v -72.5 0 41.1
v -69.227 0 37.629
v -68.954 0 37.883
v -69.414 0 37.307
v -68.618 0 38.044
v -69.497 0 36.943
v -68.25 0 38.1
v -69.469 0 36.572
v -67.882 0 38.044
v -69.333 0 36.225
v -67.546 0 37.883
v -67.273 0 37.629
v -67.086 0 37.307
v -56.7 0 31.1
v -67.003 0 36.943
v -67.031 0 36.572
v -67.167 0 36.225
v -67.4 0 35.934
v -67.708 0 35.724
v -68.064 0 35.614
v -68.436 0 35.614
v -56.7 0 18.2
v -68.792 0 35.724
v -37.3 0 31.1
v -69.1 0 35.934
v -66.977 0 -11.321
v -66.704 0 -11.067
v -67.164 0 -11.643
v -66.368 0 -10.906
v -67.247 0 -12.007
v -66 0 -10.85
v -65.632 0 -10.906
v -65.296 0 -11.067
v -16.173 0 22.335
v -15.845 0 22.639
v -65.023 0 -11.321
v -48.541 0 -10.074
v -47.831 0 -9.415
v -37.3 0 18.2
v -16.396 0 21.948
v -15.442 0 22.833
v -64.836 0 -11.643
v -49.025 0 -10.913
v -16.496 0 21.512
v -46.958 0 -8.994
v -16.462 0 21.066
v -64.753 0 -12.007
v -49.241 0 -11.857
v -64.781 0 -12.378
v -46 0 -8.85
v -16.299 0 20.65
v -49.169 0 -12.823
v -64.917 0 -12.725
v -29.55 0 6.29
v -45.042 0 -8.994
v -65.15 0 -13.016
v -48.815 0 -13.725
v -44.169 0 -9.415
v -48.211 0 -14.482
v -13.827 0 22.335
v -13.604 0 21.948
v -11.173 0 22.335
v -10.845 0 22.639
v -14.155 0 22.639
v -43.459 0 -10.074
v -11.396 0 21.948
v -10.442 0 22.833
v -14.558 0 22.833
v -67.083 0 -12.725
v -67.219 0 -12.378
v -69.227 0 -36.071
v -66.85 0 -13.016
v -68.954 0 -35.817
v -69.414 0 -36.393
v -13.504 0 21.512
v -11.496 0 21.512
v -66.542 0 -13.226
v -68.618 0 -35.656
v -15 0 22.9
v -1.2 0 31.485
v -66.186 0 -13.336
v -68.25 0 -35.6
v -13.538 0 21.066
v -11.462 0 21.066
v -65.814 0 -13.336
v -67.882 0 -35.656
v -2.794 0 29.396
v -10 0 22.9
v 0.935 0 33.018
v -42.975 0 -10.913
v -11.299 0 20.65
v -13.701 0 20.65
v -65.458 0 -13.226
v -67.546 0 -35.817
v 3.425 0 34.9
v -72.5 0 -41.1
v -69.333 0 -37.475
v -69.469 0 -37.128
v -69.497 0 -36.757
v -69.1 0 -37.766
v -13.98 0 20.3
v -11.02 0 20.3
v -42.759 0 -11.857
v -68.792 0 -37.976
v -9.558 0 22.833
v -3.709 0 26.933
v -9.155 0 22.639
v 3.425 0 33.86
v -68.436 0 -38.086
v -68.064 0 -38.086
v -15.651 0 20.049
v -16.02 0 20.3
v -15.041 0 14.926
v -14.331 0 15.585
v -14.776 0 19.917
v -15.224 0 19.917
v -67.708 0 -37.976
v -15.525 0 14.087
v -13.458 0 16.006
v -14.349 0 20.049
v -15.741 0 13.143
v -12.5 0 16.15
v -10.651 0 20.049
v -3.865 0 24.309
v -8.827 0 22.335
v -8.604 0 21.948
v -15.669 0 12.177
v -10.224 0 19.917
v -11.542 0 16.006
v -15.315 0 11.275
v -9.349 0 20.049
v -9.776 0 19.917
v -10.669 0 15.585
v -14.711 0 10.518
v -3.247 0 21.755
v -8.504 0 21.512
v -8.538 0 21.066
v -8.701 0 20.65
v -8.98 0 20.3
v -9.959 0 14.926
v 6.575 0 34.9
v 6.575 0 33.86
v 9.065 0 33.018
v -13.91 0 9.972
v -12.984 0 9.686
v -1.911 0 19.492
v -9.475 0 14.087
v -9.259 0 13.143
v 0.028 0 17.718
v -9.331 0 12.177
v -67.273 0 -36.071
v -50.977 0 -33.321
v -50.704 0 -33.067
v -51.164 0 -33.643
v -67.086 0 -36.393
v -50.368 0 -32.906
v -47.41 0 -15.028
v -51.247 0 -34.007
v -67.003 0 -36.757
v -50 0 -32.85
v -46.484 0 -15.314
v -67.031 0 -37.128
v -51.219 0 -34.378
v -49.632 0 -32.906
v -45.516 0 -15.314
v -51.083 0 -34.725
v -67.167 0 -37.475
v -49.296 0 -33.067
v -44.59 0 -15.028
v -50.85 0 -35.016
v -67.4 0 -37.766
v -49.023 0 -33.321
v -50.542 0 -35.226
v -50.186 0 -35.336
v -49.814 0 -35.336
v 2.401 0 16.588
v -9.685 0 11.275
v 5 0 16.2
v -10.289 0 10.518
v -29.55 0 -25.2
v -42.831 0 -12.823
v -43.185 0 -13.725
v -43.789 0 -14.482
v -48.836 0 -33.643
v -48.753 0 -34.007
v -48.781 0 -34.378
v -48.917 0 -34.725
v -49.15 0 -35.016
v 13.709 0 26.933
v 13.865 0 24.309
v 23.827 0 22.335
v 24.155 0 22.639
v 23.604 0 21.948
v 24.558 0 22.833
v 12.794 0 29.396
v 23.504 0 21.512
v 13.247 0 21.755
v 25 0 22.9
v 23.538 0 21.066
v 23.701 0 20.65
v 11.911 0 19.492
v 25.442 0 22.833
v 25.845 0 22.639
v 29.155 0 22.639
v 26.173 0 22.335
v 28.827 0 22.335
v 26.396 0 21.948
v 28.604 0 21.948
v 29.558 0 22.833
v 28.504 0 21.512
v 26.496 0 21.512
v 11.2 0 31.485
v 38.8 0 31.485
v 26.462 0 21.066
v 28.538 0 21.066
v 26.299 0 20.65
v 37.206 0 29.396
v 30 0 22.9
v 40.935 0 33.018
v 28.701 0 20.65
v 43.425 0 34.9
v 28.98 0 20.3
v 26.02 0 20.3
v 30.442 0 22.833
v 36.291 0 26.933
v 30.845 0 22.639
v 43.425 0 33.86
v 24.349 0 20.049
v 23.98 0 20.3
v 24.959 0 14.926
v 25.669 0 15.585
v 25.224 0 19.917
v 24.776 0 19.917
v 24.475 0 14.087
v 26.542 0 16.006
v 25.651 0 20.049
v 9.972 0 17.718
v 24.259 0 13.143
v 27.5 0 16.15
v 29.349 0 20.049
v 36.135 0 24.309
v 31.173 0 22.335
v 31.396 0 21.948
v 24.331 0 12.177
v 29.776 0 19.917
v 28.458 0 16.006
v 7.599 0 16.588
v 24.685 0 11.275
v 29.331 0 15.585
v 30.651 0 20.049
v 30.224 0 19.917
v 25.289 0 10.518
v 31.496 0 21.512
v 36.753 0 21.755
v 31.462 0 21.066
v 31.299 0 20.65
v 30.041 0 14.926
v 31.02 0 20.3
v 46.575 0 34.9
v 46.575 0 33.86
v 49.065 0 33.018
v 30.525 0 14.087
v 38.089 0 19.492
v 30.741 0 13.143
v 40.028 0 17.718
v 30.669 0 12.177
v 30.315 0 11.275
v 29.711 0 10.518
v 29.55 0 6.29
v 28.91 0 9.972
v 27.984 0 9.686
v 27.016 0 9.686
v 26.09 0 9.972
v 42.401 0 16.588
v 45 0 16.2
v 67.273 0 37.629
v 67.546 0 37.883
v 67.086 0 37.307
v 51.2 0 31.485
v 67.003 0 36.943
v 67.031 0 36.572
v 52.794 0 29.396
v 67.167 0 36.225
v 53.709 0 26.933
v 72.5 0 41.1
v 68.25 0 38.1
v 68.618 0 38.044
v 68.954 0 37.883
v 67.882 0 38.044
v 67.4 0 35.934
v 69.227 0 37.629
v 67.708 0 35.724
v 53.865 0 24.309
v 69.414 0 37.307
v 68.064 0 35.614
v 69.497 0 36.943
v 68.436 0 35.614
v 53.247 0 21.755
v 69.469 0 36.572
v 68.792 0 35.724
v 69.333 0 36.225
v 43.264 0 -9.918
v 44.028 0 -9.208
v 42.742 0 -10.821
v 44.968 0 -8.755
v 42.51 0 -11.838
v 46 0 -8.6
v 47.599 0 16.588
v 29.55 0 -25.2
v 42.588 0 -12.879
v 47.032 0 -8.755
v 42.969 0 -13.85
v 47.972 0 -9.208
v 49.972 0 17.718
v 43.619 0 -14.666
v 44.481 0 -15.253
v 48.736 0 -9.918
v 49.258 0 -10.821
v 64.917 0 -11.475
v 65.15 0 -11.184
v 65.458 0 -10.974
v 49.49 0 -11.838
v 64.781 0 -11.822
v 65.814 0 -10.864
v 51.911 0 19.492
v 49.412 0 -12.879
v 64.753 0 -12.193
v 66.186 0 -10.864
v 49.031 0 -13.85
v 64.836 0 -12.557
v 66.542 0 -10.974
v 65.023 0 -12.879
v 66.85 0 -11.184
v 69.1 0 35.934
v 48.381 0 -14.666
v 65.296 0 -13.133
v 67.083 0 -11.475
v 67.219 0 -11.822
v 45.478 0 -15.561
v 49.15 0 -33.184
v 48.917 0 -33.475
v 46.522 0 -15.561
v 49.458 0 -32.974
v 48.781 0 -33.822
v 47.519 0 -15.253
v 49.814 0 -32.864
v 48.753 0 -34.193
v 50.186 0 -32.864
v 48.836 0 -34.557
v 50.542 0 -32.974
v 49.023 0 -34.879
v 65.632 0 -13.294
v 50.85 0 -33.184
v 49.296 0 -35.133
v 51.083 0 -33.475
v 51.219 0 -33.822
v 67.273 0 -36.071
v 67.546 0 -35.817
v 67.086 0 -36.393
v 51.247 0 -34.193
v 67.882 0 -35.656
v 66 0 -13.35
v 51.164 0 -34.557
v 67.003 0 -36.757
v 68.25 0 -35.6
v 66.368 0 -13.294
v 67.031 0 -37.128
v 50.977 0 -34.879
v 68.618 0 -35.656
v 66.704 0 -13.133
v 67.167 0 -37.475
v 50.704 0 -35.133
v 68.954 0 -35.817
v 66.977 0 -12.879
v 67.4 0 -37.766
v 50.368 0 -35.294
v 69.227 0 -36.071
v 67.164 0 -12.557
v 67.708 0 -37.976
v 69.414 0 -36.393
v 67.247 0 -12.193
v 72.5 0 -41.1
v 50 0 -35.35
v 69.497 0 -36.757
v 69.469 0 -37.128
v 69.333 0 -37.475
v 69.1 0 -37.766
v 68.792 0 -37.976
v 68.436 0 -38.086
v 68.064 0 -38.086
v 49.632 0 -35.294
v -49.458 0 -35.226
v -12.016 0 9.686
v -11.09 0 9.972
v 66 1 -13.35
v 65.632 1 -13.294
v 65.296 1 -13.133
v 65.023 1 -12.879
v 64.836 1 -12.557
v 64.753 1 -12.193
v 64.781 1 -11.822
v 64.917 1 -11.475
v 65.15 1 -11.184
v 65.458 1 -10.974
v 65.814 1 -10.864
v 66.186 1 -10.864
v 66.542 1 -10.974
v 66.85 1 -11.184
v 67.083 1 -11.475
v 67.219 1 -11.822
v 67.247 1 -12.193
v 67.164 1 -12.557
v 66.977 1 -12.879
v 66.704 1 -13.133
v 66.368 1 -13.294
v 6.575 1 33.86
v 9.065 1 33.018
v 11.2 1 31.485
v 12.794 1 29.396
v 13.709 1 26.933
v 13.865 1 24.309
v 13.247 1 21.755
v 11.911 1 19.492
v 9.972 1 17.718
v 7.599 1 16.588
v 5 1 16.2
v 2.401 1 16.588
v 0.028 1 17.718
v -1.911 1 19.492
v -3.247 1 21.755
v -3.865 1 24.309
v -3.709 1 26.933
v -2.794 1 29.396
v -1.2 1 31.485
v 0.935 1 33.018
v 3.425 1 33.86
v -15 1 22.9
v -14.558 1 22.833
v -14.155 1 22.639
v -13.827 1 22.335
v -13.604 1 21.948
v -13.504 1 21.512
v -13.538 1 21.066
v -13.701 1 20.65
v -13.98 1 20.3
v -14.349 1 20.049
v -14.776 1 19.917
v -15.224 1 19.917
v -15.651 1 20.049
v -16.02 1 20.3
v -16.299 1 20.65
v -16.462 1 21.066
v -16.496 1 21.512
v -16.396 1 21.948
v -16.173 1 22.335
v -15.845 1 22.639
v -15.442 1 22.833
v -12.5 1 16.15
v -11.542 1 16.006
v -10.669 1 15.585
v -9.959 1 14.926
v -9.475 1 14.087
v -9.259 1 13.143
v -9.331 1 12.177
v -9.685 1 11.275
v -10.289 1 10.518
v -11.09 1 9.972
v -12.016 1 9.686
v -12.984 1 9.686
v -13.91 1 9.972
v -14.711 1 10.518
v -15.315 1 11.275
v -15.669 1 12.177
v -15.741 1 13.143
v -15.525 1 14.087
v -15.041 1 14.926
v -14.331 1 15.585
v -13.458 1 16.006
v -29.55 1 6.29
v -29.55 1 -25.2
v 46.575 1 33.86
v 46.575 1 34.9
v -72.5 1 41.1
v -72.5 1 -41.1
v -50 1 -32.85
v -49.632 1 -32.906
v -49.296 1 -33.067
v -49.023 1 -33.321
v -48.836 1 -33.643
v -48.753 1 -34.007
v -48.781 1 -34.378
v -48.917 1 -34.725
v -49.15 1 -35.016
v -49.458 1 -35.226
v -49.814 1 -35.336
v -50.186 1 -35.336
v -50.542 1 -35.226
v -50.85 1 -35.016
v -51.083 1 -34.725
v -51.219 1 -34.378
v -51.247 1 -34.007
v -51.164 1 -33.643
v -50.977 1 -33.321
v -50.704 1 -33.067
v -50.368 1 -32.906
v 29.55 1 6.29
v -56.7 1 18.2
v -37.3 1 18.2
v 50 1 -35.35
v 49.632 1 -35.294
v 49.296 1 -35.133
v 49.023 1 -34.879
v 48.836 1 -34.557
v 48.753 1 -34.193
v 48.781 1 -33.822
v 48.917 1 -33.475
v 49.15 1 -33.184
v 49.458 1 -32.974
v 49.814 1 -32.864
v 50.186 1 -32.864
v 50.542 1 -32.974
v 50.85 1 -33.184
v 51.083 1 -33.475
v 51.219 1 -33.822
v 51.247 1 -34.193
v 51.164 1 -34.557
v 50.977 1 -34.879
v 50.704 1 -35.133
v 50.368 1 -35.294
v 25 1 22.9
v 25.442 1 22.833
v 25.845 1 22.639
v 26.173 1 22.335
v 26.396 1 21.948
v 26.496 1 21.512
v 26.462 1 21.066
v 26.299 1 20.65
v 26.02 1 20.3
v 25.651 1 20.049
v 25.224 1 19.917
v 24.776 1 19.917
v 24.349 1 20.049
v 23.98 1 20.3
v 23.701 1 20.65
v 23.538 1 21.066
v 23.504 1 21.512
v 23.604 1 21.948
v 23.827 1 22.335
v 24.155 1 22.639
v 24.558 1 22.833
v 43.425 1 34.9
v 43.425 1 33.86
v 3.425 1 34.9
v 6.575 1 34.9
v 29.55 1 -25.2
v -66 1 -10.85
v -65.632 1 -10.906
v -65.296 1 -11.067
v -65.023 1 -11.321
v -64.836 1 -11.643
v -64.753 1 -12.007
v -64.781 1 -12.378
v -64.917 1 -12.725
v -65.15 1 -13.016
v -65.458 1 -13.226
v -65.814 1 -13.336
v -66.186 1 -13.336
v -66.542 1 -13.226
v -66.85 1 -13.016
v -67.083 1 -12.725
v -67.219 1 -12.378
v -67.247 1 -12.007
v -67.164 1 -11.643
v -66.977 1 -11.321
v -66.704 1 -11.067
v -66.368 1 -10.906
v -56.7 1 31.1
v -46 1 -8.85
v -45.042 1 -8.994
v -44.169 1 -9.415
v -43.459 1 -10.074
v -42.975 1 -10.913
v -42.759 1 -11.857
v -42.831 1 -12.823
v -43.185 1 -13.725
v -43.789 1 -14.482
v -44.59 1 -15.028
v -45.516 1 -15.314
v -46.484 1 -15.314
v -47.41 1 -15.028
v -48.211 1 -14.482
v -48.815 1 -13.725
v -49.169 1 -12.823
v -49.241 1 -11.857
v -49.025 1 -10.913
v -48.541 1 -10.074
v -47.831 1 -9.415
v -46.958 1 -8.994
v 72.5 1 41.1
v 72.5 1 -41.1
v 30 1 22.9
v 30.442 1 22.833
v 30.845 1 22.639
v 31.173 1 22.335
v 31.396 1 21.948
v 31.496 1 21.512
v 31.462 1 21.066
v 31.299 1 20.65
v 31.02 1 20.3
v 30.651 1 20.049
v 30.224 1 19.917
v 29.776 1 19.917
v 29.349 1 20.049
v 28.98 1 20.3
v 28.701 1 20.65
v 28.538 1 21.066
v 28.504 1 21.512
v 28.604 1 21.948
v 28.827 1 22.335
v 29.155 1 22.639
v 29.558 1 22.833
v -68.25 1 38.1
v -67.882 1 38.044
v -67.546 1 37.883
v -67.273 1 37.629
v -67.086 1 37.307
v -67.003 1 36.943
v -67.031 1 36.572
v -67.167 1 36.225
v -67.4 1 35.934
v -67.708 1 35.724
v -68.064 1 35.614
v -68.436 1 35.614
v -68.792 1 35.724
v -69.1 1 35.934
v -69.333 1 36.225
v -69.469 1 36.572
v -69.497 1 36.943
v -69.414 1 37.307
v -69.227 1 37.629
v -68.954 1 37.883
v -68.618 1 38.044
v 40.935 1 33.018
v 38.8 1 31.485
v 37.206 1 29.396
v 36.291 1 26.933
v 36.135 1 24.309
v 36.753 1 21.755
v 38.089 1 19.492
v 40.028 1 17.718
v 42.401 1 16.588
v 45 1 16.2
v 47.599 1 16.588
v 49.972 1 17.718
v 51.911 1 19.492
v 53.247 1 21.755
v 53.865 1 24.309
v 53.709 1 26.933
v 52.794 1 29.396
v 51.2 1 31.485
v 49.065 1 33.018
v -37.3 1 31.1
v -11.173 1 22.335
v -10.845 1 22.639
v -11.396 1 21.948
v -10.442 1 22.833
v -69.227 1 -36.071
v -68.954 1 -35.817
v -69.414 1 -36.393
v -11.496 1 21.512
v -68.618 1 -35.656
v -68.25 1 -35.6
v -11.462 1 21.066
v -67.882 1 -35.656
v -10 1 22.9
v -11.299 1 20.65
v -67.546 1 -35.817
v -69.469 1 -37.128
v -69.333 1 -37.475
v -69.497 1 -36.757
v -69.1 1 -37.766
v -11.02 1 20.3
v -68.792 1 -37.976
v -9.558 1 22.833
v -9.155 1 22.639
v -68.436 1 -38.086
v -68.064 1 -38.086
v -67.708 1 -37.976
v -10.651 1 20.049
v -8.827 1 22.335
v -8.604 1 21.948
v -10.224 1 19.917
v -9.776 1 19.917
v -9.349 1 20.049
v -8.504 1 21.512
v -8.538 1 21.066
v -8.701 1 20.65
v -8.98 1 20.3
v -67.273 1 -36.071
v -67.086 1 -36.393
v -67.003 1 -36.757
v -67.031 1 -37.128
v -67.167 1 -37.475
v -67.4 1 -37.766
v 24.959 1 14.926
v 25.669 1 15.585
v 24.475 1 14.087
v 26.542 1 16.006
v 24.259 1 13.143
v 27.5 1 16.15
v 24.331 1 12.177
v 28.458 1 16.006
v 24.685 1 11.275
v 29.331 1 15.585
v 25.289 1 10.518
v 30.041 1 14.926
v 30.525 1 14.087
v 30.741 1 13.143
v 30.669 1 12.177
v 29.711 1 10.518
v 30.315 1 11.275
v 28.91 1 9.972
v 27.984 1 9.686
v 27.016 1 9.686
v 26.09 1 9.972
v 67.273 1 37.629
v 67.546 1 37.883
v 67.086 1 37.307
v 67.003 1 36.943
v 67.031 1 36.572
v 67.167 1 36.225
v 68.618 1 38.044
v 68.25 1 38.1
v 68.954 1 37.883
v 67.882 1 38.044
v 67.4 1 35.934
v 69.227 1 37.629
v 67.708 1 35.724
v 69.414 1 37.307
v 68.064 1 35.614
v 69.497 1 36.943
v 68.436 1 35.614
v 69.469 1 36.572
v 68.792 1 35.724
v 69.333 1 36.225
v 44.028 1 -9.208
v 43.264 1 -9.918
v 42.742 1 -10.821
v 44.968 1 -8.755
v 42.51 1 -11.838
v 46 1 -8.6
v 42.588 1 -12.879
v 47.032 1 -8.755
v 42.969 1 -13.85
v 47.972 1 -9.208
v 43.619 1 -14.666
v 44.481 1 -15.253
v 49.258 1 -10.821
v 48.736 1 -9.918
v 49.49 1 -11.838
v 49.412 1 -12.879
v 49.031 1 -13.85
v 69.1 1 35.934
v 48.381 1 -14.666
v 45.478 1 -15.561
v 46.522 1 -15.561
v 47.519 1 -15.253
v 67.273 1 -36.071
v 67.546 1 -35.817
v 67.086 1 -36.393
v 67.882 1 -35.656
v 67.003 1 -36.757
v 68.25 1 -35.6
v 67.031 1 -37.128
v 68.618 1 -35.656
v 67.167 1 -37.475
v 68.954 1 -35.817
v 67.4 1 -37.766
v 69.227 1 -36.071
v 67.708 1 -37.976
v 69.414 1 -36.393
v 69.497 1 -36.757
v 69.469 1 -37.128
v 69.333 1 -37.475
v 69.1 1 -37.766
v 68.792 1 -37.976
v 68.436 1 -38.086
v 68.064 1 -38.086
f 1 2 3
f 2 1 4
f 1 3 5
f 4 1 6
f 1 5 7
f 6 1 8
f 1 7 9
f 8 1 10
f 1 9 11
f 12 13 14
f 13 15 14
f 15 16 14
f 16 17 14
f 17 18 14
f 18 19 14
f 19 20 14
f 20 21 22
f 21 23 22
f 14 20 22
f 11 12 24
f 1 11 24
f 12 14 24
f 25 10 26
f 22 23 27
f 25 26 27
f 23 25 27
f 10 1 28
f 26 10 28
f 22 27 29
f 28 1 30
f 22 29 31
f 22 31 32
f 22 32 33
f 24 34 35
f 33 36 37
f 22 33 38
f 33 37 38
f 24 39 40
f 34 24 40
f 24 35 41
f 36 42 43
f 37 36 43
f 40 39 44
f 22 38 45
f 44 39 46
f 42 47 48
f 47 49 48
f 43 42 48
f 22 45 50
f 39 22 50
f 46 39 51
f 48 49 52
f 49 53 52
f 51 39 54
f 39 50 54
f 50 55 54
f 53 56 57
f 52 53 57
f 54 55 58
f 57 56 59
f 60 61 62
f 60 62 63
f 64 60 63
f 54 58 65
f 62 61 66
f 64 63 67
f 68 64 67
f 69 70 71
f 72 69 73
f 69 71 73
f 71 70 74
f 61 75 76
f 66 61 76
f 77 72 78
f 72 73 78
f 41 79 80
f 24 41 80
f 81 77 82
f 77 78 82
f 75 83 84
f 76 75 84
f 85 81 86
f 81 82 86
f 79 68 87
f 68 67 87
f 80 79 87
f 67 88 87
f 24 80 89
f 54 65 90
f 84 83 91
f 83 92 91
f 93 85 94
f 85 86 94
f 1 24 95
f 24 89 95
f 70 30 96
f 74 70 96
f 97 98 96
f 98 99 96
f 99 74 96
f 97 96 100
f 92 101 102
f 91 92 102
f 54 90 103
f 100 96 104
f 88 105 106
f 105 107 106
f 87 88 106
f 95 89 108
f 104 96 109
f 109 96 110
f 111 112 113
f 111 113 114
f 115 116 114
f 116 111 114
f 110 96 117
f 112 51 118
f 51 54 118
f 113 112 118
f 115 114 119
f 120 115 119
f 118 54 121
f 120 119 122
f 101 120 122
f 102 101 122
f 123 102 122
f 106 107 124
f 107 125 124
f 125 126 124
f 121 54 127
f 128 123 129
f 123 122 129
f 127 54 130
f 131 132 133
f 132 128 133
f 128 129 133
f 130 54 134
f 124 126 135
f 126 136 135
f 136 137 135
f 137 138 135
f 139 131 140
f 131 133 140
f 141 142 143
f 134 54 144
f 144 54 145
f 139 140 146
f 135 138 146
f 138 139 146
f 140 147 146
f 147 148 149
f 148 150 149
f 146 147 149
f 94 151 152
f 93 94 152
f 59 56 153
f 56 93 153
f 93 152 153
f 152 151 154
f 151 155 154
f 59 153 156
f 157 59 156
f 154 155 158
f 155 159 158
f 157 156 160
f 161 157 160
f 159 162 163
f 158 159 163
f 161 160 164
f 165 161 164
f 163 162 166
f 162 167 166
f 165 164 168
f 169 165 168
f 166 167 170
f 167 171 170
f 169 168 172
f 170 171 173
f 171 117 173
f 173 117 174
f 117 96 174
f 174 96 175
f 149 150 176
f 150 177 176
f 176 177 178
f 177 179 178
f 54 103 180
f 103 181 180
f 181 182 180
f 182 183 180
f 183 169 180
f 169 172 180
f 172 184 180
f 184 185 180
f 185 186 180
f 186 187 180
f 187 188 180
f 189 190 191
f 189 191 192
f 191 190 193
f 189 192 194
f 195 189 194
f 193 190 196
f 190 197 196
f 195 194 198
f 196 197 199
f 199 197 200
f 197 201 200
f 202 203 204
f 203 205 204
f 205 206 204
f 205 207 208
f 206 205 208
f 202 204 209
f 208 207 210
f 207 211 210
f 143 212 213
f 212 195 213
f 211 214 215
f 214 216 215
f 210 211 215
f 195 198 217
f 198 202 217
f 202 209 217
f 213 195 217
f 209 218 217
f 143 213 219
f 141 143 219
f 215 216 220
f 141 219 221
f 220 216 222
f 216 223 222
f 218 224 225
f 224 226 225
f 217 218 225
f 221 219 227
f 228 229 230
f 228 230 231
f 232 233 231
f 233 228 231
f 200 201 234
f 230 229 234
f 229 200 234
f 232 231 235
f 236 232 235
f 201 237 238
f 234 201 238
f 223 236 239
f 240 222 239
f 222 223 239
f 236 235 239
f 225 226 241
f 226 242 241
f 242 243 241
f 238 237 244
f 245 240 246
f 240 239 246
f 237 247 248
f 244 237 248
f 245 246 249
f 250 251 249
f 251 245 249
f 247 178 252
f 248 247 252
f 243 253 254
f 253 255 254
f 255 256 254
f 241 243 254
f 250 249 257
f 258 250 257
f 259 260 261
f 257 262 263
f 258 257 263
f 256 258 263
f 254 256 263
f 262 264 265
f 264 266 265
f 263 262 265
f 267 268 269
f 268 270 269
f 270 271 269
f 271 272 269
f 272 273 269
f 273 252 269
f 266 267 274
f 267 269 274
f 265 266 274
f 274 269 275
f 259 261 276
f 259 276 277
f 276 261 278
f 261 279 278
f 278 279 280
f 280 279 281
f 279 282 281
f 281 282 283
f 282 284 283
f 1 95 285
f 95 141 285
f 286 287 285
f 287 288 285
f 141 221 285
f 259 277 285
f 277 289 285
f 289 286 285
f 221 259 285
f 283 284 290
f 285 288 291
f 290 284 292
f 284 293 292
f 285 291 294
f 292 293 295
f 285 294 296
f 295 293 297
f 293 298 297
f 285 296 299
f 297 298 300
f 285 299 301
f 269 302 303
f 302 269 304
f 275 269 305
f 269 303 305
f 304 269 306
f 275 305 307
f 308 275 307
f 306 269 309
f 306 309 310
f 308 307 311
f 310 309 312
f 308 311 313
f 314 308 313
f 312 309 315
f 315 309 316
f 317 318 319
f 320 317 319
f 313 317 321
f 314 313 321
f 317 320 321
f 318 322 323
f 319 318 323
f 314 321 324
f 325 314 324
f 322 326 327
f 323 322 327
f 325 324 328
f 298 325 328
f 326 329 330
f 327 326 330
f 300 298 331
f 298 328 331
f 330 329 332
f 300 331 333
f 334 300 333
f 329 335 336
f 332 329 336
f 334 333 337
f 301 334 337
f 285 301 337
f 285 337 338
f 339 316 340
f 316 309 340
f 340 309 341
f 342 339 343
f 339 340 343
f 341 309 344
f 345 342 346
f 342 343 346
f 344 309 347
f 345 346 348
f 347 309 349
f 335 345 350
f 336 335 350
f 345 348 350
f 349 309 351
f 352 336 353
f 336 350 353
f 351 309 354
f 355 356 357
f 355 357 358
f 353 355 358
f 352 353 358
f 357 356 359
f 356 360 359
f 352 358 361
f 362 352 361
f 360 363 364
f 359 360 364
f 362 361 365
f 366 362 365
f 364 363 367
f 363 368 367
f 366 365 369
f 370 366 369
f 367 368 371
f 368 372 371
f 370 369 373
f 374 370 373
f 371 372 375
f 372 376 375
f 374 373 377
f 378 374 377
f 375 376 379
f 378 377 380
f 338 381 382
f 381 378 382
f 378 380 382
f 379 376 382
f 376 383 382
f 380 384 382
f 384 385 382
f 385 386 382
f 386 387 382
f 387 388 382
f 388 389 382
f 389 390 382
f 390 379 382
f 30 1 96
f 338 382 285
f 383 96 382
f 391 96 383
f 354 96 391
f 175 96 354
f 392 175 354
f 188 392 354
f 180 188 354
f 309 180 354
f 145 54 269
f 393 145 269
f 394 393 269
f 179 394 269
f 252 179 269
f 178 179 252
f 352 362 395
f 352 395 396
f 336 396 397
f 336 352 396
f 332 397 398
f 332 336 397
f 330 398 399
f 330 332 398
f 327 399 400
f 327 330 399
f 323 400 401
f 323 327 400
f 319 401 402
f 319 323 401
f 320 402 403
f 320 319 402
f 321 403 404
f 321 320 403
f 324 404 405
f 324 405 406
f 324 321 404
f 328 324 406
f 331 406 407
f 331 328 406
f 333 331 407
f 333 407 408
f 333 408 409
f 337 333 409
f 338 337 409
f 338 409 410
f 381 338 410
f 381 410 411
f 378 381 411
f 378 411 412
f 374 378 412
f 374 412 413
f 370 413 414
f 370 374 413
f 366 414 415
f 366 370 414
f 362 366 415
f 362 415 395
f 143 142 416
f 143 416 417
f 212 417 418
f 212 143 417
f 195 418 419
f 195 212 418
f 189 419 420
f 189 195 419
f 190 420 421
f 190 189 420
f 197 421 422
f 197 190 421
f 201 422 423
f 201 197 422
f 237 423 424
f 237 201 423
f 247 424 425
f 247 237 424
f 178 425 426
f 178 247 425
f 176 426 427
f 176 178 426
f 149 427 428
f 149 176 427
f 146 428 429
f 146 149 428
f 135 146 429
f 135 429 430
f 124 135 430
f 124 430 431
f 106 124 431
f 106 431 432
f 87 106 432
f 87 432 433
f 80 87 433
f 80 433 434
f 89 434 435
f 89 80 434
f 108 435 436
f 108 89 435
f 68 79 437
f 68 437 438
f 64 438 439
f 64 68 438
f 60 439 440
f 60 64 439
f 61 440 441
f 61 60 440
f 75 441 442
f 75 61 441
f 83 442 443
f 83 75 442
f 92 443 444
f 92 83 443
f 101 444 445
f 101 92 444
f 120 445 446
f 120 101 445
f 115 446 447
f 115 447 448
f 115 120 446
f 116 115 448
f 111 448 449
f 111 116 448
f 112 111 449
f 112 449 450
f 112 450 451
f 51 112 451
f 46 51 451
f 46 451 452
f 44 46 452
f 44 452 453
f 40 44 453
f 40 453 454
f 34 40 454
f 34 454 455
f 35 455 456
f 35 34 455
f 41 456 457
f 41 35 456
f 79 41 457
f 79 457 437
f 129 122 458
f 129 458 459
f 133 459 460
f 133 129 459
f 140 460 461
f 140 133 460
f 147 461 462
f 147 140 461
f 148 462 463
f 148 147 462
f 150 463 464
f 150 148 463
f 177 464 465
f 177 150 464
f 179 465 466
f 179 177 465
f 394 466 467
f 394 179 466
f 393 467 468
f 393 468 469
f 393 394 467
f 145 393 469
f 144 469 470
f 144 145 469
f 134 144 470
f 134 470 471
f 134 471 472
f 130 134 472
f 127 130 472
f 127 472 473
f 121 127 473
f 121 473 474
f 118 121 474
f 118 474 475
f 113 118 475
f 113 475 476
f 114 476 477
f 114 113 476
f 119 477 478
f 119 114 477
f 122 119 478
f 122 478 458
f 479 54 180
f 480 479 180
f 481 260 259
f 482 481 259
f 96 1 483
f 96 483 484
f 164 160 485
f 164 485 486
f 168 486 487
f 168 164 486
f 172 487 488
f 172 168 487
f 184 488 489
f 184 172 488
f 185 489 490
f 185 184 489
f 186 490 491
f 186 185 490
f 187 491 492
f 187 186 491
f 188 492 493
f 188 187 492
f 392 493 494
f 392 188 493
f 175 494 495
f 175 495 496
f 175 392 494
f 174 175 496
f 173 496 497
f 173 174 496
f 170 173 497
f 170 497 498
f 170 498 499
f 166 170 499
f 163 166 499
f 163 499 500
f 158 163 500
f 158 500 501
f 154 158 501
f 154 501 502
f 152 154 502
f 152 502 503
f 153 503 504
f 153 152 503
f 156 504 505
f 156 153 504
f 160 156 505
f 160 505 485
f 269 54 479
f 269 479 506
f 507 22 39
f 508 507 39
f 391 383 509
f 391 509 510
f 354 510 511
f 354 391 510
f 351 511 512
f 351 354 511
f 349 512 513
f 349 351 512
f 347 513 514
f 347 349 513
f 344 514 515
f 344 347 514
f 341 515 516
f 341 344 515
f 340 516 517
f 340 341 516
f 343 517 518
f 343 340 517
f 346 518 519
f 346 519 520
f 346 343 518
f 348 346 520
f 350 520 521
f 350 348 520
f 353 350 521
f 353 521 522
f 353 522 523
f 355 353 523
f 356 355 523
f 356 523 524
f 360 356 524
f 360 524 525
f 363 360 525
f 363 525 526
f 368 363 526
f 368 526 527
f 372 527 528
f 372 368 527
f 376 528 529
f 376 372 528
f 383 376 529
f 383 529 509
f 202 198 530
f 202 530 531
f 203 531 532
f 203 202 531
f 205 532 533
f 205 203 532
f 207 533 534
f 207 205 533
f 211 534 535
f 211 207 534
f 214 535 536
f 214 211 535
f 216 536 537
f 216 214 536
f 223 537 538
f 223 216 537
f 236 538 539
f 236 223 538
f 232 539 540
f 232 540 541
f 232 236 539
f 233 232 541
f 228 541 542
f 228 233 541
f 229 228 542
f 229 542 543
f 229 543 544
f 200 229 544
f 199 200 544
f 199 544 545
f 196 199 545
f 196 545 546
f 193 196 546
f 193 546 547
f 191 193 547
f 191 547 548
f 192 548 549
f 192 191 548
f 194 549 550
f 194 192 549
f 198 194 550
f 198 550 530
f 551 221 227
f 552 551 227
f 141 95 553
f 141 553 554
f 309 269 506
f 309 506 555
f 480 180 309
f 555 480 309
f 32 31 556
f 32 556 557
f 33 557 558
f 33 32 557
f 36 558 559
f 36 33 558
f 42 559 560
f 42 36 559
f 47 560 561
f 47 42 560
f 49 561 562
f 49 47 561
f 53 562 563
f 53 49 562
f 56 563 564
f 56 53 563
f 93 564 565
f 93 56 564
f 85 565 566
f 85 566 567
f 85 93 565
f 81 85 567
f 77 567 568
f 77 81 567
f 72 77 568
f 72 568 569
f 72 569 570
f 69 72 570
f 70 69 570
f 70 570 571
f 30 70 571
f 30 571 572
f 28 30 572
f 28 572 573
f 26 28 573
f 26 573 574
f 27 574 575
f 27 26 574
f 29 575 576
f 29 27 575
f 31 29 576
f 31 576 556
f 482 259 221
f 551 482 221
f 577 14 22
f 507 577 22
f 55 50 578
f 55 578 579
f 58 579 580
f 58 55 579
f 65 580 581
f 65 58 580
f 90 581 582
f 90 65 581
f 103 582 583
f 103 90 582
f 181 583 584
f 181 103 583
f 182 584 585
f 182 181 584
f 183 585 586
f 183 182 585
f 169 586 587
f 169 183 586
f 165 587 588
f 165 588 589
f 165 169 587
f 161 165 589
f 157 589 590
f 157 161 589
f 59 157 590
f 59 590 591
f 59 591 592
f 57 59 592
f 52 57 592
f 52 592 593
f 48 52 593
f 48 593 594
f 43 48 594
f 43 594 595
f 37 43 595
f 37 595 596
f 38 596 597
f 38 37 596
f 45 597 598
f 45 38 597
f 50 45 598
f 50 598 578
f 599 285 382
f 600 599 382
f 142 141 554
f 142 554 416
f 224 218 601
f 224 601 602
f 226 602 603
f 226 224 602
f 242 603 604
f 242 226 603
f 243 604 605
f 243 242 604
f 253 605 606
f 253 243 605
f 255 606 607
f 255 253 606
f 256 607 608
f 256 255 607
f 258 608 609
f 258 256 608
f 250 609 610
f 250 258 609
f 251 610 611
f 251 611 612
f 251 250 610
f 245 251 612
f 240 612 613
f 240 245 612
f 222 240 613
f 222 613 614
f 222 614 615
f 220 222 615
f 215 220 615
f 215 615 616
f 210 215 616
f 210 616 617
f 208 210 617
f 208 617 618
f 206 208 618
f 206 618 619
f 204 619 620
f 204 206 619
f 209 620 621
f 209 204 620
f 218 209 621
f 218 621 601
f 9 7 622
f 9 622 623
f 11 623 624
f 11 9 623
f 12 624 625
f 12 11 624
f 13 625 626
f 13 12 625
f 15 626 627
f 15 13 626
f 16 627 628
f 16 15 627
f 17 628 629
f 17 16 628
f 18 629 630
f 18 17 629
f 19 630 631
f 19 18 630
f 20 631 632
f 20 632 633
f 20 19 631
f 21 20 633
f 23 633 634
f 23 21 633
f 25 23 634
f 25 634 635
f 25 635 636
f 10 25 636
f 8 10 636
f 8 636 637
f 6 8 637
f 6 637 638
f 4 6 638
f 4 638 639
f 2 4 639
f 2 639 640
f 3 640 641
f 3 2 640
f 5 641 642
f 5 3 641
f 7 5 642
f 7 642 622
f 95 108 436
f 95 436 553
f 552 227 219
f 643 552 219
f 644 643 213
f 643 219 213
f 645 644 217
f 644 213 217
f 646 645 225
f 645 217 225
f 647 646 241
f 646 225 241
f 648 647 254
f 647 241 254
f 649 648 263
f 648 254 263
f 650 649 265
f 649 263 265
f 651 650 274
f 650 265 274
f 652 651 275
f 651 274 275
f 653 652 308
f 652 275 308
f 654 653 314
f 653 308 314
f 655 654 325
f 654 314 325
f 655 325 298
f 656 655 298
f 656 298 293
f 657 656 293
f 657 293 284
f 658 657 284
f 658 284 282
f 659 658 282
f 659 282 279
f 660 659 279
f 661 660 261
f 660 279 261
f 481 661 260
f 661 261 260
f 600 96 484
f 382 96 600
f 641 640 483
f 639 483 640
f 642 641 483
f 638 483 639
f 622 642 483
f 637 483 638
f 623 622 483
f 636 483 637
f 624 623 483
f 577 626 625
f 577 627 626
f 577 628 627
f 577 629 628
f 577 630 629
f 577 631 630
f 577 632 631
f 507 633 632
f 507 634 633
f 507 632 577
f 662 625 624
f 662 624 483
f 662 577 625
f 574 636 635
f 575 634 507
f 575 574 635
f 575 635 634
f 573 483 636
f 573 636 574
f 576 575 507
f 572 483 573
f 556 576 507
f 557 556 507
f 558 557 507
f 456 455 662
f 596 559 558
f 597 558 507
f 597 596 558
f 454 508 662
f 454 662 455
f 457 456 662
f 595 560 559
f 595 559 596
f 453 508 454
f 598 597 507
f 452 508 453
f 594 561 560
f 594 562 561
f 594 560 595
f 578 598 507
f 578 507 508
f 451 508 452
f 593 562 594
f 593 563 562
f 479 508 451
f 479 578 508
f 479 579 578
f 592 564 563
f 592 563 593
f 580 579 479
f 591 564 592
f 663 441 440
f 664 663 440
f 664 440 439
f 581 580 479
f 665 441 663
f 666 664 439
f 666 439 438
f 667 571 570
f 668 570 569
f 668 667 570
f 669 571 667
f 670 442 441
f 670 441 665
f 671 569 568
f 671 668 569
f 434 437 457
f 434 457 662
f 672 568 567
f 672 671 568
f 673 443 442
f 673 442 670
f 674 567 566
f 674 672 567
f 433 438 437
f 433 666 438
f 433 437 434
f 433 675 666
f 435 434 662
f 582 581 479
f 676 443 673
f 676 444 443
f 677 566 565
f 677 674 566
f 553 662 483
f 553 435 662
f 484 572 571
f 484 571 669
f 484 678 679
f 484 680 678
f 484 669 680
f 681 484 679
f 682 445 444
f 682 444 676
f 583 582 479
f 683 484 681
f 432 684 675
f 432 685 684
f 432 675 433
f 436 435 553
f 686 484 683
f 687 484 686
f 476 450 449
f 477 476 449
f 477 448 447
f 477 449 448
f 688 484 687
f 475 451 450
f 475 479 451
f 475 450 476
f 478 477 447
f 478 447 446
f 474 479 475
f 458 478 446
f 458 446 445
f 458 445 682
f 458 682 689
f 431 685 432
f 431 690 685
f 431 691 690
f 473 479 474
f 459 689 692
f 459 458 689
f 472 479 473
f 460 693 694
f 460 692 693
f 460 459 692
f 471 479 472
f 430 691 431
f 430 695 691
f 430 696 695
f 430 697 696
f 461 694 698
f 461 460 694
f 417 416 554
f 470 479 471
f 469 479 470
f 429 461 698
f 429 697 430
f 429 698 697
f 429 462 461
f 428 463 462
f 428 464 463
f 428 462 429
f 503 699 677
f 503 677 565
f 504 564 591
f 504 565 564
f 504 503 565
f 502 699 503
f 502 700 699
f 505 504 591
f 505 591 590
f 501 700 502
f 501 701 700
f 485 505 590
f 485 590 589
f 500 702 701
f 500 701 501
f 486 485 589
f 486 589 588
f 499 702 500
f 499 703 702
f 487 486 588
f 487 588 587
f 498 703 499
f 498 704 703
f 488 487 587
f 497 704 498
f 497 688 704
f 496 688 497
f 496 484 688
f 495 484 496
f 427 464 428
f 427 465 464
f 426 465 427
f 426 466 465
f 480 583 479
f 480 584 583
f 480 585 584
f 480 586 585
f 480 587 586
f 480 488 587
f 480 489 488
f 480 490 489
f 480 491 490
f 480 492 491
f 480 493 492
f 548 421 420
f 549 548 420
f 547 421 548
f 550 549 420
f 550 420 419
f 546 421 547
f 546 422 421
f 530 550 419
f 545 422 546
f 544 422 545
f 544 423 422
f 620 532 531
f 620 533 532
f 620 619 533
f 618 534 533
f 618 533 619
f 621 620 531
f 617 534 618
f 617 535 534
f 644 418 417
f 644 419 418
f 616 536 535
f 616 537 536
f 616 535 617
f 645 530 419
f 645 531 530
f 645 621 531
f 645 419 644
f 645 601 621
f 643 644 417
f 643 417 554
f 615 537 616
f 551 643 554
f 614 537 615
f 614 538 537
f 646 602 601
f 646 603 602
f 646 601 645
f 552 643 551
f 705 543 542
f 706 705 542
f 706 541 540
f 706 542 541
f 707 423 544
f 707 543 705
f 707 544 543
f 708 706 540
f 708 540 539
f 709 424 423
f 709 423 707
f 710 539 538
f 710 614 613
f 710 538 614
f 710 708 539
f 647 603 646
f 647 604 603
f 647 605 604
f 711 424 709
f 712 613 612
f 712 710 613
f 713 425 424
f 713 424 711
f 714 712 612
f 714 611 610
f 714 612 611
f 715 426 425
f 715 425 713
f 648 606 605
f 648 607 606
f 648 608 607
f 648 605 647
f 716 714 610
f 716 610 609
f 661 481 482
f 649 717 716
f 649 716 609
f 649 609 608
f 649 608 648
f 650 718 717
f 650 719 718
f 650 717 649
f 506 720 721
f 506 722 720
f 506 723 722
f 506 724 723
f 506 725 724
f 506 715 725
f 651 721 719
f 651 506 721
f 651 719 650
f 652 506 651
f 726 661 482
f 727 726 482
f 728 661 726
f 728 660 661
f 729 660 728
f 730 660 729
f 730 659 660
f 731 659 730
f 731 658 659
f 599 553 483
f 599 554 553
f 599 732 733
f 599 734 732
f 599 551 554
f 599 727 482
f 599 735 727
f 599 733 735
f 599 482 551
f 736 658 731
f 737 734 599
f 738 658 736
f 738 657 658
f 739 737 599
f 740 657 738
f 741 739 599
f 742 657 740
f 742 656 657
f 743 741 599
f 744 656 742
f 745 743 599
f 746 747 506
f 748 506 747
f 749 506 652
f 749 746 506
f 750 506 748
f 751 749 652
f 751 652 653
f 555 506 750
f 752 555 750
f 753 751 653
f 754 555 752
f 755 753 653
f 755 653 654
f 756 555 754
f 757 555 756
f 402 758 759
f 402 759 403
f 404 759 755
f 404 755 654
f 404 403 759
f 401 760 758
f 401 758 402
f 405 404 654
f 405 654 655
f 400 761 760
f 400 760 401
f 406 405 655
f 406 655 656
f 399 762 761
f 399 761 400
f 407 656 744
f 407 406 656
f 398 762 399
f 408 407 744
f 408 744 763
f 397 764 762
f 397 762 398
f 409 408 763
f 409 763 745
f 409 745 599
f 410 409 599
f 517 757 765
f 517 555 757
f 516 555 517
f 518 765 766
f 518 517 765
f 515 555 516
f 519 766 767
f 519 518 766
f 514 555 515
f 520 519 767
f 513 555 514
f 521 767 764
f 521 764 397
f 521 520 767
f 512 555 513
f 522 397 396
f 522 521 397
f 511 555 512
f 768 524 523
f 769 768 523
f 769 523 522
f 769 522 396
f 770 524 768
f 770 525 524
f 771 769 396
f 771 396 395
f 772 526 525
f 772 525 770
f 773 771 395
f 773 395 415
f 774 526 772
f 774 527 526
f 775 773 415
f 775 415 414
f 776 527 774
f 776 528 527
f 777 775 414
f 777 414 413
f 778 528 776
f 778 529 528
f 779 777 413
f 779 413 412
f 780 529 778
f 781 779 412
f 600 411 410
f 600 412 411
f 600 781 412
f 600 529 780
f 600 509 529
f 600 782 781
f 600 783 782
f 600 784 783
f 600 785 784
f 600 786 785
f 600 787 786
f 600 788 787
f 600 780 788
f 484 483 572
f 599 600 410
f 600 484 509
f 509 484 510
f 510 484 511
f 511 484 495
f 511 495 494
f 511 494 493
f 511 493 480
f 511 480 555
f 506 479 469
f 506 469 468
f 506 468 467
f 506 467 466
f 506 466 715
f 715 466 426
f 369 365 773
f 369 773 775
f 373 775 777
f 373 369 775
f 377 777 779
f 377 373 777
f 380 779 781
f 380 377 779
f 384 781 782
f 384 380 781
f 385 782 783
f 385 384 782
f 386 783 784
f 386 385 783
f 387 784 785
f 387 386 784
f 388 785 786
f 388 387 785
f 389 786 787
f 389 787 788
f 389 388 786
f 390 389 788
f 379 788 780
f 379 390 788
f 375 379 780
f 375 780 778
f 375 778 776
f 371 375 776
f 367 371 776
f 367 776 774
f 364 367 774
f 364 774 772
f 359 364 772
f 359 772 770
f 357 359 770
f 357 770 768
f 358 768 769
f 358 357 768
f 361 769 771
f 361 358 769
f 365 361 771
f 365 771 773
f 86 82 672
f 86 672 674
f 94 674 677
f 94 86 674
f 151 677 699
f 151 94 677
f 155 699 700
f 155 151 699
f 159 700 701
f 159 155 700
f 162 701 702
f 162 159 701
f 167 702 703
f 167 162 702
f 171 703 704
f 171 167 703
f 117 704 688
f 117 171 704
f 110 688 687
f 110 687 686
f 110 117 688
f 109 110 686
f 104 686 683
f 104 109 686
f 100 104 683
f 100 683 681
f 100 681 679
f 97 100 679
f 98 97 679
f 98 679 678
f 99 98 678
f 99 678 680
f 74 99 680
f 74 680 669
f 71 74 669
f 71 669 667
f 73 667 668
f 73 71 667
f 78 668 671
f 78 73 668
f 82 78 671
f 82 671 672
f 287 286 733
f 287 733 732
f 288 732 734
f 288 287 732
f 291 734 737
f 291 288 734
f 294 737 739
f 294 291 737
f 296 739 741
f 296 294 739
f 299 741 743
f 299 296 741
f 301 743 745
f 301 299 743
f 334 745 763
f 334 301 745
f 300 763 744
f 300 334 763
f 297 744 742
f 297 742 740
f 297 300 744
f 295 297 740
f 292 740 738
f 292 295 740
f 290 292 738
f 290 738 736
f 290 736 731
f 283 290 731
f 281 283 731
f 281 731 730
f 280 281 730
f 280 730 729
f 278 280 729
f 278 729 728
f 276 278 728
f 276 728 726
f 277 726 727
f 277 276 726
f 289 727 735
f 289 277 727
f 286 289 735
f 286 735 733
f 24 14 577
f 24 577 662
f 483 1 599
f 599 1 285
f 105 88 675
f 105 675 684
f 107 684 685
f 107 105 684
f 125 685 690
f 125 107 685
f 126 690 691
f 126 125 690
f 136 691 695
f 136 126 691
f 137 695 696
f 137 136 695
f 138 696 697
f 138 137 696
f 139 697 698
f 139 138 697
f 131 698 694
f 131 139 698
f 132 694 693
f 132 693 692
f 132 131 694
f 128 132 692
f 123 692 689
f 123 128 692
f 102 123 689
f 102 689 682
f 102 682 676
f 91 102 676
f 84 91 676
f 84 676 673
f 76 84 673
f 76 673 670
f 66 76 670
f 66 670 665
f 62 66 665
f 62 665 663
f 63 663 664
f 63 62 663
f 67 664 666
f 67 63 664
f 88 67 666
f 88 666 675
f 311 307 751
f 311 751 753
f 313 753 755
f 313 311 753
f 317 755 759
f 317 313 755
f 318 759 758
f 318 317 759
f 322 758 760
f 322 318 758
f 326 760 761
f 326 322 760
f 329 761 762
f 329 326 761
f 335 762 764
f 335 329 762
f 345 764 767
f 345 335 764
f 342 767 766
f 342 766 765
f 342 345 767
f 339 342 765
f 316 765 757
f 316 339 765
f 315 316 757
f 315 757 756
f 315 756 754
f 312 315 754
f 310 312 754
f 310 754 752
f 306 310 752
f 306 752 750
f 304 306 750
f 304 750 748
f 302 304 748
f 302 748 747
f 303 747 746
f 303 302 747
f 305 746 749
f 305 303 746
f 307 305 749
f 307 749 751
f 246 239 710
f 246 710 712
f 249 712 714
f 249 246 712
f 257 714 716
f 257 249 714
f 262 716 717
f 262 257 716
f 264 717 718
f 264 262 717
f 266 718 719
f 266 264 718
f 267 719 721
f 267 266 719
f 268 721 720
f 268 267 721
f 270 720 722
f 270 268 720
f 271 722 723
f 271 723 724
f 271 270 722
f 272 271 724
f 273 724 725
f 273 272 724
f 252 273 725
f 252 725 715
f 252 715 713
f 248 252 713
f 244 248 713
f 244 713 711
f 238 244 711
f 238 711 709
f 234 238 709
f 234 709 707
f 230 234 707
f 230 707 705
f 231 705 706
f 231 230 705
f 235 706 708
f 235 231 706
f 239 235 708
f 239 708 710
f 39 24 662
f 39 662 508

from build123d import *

# Parameters (mm, degrees)
SKETCH2_W           = 145
SKETCH2_H           = 82.2
SKETCH2_R           = 1.25
SKETCH2_R_2         = 1.5
SKETCH2_R_3         = 3.25
SKETCH2_R_4         = 3.5
SKETCH2_W_2         = 19.4
SKETCH2_H_2         = 12.9
SKETCH2_W_3         = 59.1
SKETCH2_H_3         = 31.49
BOSS_EXTRUDE1_DEPTH = 1


with BuildPart() as part:
    # Sketch2 → Boss-Extrude1 (new body)
    with BuildSketch(Plane(origin=(0, 0, 0), x_dir=(1, 0, 0), z_dir=(0, 1, 0))):
        Rectangle(SKETCH2_W, SKETCH2_H)
        with Locations(Location((-68.25, -36.85, 0), (0, 0, 270))):
            Circle(SKETCH2_R, mode=Mode.SUBTRACT)
        with Locations(Location((68.25, -36.85, 0), (0, 0, 270))):
            Circle(SKETCH2_R, mode=Mode.SUBTRACT)
        with Locations(Location((-10, -21.4, 0), (0, 0, 270))):
            Circle(SKETCH2_R_2, mode=Mode.SUBTRACT)
        with Locations(Location((30, -21.4, 0), (0, 0, 270))):
            Circle(SKETCH2_R_2, mode=Mode.SUBTRACT)
        with Locations(Location((-15, -21.4, 0), (0, 0, 270))):
            Circle(SKETCH2_R_2, mode=Mode.SUBTRACT)
        with Locations(Location((25, -21.4, 0), (0, 0, 270))):
            Circle(SKETCH2_R_2, mode=Mode.SUBTRACT)
        with Locations(Location((-12.5, -12.9, 0), (0, 0, 270))):
            Circle(SKETCH2_R_3, mode=Mode.SUBTRACT)
        with Locations(Location((-46, 12.1, 0), (0, 0, 270))):
            Circle(SKETCH2_R_3, mode=Mode.SUBTRACT)
        with Locations(Location((46, 12.1, 0), (0, 0, 270))):
            Circle(SKETCH2_R_4, mode=Mode.SUBTRACT)
        with Locations(Location((-68.25, 36.85, 0), (0, 0, 270))):
            Circle(SKETCH2_R, mode=Mode.SUBTRACT)
        with Locations(Location((68.25, 36.85, 0), (0, 0, 270))):
            Circle(SKETCH2_R, mode=Mode.SUBTRACT)
        with Locations(Location((-66, 12.1, 0), (0, 0, 270))):
            Circle(SKETCH2_R, mode=Mode.SUBTRACT)
        with Locations(Location((-50, 34.1, 0), (0, 0, 270))):
            Circle(SKETCH2_R, mode=Mode.SUBTRACT)
        with Locations(Location((66, 12.1, 0), (0, 0, 90))):
            Circle(SKETCH2_R, mode=Mode.SUBTRACT)
        with Locations(Location((50, 34.1, 0), (0, 0, 90))):
            Circle(SKETCH2_R, mode=Mode.SUBTRACT)
        with Locations(Location((27.5, -12.9, 0), (0, 0, 270))):
            Circle(SKETCH2_R_3, mode=Mode.SUBTRACT)
        with BuildLine():
            Line((3.425, -33.859530524), (3.425, -34.9))
            Line((3.425, -34.9), (6.575, -34.9))
            Line((6.575, -34.9), (6.575, -33.859530524))
            ThreePointArc((6.575, -33.859530524), (5, -16.2), (3.425, -33.859530524))
        make_face(mode=Mode.SUBTRACT)
        with BuildLine():
            Line((43.425, -34.9), (43.425, -33.859530524))
            ThreePointArc((43.425, -33.859530524), (45, -16.2), (46.575, -33.859530524))
            Line((46.575, -33.859530524), (46.575, -34.9))
            Line((46.575, -34.9), (43.425, -34.9))
        make_face(mode=Mode.SUBTRACT)
        with Locations((-47, -24.65)):
            Rectangle(SKETCH2_W_2, SKETCH2_H_2, mode=Mode.SUBTRACT)
        with Locations((0, 9.455)):
            Rectangle(SKETCH2_W_3, SKETCH2_H_3, mode=Mode.SUBTRACT)
    extrude(amount=BOSS_EXTRUDE1_DEPTH)


solid = part.part
